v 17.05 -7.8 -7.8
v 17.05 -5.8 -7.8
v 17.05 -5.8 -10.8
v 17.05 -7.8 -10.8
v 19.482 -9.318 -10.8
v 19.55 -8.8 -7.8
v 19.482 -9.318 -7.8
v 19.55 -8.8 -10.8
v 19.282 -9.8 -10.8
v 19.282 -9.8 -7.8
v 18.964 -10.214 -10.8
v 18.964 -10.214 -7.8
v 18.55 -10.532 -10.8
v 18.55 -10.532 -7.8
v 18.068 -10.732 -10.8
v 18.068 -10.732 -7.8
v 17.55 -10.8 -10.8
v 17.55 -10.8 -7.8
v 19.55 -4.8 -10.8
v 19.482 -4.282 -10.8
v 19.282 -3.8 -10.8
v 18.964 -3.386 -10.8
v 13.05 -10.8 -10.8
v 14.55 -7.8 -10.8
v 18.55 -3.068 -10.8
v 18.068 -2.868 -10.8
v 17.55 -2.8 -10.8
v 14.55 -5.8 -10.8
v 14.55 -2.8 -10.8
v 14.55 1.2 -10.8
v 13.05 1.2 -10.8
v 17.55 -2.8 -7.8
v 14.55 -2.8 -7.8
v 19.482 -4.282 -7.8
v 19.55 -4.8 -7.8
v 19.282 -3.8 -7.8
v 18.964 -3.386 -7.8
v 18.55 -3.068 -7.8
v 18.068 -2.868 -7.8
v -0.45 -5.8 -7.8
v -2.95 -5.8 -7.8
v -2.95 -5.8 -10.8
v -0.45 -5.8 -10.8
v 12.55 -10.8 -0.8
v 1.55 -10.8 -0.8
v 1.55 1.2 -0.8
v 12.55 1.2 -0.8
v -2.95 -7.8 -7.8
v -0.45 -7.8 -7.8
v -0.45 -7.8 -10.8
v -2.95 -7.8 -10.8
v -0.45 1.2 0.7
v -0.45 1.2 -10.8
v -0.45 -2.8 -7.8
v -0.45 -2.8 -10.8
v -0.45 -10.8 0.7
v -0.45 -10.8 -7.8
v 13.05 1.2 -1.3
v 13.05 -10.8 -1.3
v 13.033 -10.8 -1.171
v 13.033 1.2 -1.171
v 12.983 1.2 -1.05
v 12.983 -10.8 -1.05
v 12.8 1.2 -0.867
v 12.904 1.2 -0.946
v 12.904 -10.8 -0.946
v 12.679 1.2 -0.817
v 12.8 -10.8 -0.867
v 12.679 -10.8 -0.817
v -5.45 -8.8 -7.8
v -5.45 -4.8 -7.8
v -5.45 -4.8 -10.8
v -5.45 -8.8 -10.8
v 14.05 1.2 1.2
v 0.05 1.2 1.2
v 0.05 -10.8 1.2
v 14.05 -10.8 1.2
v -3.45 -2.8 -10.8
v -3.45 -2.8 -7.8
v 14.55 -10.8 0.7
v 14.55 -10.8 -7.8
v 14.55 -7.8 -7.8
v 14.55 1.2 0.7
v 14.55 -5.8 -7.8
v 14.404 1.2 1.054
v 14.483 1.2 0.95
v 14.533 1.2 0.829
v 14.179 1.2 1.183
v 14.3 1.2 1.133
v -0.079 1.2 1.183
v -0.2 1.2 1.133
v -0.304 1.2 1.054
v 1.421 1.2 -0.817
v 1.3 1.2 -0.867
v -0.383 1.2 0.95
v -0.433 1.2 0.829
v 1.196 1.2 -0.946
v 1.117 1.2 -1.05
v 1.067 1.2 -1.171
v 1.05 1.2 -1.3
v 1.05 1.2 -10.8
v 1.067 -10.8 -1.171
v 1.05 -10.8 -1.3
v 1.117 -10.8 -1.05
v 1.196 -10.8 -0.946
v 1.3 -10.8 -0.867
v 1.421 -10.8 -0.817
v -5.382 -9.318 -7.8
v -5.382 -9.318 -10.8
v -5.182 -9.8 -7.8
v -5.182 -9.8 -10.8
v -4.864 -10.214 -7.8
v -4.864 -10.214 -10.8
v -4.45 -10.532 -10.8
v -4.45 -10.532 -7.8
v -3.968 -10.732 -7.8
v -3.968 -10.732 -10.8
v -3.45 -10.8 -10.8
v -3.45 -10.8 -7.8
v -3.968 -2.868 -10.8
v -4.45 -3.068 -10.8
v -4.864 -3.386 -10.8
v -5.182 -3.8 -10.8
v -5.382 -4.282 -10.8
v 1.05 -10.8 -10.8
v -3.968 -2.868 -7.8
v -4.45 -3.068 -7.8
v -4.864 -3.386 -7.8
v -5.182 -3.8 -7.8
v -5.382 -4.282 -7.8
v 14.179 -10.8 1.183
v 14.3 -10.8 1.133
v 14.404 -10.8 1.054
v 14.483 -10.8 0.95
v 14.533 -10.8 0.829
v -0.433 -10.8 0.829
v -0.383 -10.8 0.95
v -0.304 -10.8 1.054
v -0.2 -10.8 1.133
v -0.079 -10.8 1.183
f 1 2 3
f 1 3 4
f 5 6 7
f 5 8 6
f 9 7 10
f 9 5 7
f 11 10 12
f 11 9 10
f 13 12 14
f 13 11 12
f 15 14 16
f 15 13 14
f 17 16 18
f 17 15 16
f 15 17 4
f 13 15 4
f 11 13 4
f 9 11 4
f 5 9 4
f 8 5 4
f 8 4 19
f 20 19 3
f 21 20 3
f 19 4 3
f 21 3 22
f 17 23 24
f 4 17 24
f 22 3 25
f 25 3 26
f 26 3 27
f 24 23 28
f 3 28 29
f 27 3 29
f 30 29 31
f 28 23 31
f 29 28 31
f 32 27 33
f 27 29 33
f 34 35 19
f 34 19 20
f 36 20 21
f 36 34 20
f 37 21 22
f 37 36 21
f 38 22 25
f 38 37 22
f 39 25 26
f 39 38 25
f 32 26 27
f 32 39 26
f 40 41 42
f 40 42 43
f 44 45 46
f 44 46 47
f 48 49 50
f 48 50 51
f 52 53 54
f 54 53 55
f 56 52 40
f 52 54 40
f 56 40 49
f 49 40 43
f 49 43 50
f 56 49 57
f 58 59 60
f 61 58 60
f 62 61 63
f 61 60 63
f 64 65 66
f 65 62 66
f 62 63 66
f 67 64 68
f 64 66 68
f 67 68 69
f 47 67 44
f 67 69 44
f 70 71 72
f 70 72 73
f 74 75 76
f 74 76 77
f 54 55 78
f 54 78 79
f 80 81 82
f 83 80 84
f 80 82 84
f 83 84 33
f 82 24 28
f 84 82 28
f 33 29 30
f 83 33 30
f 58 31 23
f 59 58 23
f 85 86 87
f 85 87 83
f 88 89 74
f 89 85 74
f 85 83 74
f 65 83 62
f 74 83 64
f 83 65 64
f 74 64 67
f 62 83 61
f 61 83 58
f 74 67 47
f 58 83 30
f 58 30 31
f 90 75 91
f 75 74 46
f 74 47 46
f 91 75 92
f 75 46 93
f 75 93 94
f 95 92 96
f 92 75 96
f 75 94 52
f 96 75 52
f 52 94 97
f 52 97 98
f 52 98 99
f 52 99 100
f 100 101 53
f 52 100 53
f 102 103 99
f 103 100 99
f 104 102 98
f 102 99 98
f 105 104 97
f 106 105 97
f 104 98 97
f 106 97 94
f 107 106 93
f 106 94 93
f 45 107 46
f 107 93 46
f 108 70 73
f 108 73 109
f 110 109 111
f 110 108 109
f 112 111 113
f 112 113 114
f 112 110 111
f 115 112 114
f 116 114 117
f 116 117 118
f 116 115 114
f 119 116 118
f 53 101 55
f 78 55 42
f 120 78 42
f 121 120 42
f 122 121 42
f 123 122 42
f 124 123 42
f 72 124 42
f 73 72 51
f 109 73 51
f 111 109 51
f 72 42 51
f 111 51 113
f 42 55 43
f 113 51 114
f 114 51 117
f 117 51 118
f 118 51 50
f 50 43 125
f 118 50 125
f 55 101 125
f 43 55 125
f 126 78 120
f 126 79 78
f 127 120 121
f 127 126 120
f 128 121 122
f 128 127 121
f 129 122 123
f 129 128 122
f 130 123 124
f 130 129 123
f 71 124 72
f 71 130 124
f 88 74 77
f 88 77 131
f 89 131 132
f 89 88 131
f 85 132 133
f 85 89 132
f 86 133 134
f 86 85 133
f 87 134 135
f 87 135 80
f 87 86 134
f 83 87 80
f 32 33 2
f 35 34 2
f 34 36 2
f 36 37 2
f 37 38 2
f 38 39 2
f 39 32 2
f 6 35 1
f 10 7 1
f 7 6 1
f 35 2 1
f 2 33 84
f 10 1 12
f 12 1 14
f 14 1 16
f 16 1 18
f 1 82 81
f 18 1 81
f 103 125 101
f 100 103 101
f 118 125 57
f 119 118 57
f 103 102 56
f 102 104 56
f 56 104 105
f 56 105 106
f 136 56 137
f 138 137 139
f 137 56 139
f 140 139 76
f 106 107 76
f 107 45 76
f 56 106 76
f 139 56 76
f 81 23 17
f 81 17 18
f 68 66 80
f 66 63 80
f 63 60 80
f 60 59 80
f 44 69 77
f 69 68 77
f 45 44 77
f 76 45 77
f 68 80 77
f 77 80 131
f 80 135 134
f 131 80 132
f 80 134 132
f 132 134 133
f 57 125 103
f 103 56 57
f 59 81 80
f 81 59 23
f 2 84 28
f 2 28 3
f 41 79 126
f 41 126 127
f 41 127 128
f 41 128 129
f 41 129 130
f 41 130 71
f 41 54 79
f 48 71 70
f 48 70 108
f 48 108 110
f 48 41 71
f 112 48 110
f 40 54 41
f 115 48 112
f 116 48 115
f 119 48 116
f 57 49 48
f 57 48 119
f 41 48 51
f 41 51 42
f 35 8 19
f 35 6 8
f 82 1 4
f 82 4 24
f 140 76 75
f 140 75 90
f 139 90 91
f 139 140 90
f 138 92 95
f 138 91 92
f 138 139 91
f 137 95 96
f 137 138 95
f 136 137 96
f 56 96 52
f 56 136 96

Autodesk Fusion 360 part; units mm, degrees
sketch "Esquisse1" plane through (0, 0, 0) normal (0, 0, 1) x (1, 0, 0)
  line L0 (0, 0) -> (1.5, 0)
  line L1 (1.5, 0) -> (1.5, 1.2)
  line L2 (1.5, 1.2) -> (0, 1.2)
  line L3 (0, 1.2) -> (0, 0)
  dimension "d1" = 1.5
  dimension "d2" = 1.2
extrude "Extrusion1" add sketch "Esquisse1" along normal blind 1.2
sketch "Esquisse2" plane through (0, 0, 0) normal (0, 0, -1) x (1, 0, 0)
  line L0 (0, 0) -> (0, -1.2)
  line L1 (0, -1.2) -> (1.5, -1.2)
  line L2 (1.5, -1.2) -> (1.5, 0)
  line L3 (1.5, 0) -> (0, 0)
  line L4 (1.35, 0) -> (0.15, 0)
  line L5 (0.15, 0) -> (0.15, -1.2)
  line L6 (0.15, -1.2) -> (1.35, -1.2)
  line L7 (1.35, -1.2) -> (1.35, 0)
  line L8 (0.75, -1.2) -> (0.75, 0)
  dimension "d5" = 1.2
  dimension "d7" = 0.6
extrude "Extrusion2" cut sketch "Esquisse2" against normal blind 1 contours L1 L3 L4 L5 L6 L8 | L1 L3 L4 L6 L7 L8
sketch "Esquisse3" plane through (1.5, 0, 0) normal (1, 0, 0) x (0, 1, 0)
  line L0 (0, 0) -> (1.2, 0)
  line L1 (1.2, 0) -> (1.2, 1.2)
  line L2 (1.2, 1.2) -> (0, 1.2)
  line L3 (0, 1.2) -> (0, 0)
  line L4 (0, 0) -> (0.8, 0)
  line L5 (0.8, 0) -> (0.8, 0.3)
  line L6 (0.8, 0.3) -> (0, 0.3)
  line L7 (0, 0.3) -> (0, 0)
  dimension "d10" = 0.8
  dimension "d11" = 0.3
extrude "Extrusion3" add sketch "Esquisse3" along normal blind 0.5 contours L0 L3 L4 L5 L6 L7
sketch "Esquisse4" plane through (0, 0, 0.3) normal (0, 0, 1) x (-1, 0, 0)
  line L0 (-1.5, -0.8) -> (-1.5, 0)
  line L1 (-1.5, 0) -> (-2, 0)
  line L2 (-2, 0) -> (-2, -0.8)
  line L3 (-2, -0.8) -> (-1.5, -0.8)
  line L4 (-1.5, -0.5) -> (-1.75, -0.5)
  line L5 (-1.75, -0.5) -> (-1.75, -0.3)
  line L6 (-1.75, -0.3) -> (-1.5, -0.3)
  line L7 (-1.5, -0.3) -> (-1.5, -0.5)
  line L8 (-1.5, -0.4) -> (-2, -0.4)
  dimension "d14" = 0.4
  dimension "d15" = 0.1
  dimension "d16" = 0.2
  dimension "d27" = 0.25
extrude "Extrusion4" cut sketch "Esquisse4" against normal blind 0.5 contours L0 L4 L5 L7 L8 | L0 L5 L6 L7 L8
sketch "Esquisse5" plane through (0, 0, 0.3) normal (0, 0, 1) x (-1, 0, 0)
  line L0 (-1.75, -0.3) -> (-1.5, -0.3)
  line L1 (-1.5, -0.3) -> (-1.5, 0)
  line L2 (-1.5, 0) -> (-2, 0)
  line L3 (-2, 0) -> (-2, -0.8)
  line L4 (-2, -0.8) -> (-1.5, -0.8)
  line L5 (-1.5, -0.8) -> (-1.5, -0.5)
  line L6 (-1.5, -0.5) -> (-1.75, -0.5)
  line L7 (-1.75, -0.5) -> (-1.75, -0.3)
sketch "Esquisse6" plane through (0, 0, 0) normal (-1, 0, 0) x (0, -1, 0)
  line L0 (-1.2, 0) -> (0, 0)
  line L1 (0, 0) -> (0, 1.2)
  line L2 (0, 1.2) -> (-1.2, 1.2)
  line L3 (-1.2, 1.2) -> (-1.2, 0)
  line L4 (0, 0) -> (-0.8, 0)
  line L5 (-0.8, 0) -> (-0.8, 0.3)
  line L6 (-0.8, 0.3) -> (0, 0.3)
  line L7 (0, 0.3) -> (0, 0)
  dimension "d19" = 0.8
  dimension "d20" = 0.3
extrude "Extrusion5" add sketch "Esquisse6" along normal blind 0.5 contours L0 L1 L4 L5 L6 L7
sketch "Esquisse7" plane through (0, 0, 0.3) normal (0, 0, 1) x (-1, 0, 0)
  line L0 (0, 0) -> (0, -0.8)
  line L1 (0, -0.8) -> (0.5, -0.8)
  line L2 (0.5, -0.8) -> (0.5, 0)
  line L3 (0.5, 0) -> (0, 0)
  line L4 (0, -0.4) -> (0.5, -0.4)
  line L5 (0, -0.3) -> (0.25, -0.3)
  line L6 (0.25, -0.3) -> (0.25, -0.5)
  line L7 (0.25, -0.5) -> (0, -0.5)
  line L8 (0, -0.5) -> (0, -0.3)
  dimension "d23" = 0.25
  dimension "d24" = 0.2
extrude "Extrusion6" cut sketch "Esquisse7" against normal blind 0.6 contours L0 L4 L5 L6 L8 | L0 L4 L6 L7 L8
fillet "Congé1" radius 0.2 4 edges at (2, 0, 0.15) (2, 0.8, 0.15) (-0.5, 0, 0.15) (-0.5, 0.8, 0.15)
fillet "Congé2" radius 0.05 2 edges at (1.5, 0.6, 1.2) (0, 0.6, 1.2)
fillet "Congé3" radius 0.05 2 edges at (1.35, 0.6, 1) (0.15, 0.6, 1)
scale "Echelle1" factor 10 about (0.05, 1.2, 1.2) bodies 1
